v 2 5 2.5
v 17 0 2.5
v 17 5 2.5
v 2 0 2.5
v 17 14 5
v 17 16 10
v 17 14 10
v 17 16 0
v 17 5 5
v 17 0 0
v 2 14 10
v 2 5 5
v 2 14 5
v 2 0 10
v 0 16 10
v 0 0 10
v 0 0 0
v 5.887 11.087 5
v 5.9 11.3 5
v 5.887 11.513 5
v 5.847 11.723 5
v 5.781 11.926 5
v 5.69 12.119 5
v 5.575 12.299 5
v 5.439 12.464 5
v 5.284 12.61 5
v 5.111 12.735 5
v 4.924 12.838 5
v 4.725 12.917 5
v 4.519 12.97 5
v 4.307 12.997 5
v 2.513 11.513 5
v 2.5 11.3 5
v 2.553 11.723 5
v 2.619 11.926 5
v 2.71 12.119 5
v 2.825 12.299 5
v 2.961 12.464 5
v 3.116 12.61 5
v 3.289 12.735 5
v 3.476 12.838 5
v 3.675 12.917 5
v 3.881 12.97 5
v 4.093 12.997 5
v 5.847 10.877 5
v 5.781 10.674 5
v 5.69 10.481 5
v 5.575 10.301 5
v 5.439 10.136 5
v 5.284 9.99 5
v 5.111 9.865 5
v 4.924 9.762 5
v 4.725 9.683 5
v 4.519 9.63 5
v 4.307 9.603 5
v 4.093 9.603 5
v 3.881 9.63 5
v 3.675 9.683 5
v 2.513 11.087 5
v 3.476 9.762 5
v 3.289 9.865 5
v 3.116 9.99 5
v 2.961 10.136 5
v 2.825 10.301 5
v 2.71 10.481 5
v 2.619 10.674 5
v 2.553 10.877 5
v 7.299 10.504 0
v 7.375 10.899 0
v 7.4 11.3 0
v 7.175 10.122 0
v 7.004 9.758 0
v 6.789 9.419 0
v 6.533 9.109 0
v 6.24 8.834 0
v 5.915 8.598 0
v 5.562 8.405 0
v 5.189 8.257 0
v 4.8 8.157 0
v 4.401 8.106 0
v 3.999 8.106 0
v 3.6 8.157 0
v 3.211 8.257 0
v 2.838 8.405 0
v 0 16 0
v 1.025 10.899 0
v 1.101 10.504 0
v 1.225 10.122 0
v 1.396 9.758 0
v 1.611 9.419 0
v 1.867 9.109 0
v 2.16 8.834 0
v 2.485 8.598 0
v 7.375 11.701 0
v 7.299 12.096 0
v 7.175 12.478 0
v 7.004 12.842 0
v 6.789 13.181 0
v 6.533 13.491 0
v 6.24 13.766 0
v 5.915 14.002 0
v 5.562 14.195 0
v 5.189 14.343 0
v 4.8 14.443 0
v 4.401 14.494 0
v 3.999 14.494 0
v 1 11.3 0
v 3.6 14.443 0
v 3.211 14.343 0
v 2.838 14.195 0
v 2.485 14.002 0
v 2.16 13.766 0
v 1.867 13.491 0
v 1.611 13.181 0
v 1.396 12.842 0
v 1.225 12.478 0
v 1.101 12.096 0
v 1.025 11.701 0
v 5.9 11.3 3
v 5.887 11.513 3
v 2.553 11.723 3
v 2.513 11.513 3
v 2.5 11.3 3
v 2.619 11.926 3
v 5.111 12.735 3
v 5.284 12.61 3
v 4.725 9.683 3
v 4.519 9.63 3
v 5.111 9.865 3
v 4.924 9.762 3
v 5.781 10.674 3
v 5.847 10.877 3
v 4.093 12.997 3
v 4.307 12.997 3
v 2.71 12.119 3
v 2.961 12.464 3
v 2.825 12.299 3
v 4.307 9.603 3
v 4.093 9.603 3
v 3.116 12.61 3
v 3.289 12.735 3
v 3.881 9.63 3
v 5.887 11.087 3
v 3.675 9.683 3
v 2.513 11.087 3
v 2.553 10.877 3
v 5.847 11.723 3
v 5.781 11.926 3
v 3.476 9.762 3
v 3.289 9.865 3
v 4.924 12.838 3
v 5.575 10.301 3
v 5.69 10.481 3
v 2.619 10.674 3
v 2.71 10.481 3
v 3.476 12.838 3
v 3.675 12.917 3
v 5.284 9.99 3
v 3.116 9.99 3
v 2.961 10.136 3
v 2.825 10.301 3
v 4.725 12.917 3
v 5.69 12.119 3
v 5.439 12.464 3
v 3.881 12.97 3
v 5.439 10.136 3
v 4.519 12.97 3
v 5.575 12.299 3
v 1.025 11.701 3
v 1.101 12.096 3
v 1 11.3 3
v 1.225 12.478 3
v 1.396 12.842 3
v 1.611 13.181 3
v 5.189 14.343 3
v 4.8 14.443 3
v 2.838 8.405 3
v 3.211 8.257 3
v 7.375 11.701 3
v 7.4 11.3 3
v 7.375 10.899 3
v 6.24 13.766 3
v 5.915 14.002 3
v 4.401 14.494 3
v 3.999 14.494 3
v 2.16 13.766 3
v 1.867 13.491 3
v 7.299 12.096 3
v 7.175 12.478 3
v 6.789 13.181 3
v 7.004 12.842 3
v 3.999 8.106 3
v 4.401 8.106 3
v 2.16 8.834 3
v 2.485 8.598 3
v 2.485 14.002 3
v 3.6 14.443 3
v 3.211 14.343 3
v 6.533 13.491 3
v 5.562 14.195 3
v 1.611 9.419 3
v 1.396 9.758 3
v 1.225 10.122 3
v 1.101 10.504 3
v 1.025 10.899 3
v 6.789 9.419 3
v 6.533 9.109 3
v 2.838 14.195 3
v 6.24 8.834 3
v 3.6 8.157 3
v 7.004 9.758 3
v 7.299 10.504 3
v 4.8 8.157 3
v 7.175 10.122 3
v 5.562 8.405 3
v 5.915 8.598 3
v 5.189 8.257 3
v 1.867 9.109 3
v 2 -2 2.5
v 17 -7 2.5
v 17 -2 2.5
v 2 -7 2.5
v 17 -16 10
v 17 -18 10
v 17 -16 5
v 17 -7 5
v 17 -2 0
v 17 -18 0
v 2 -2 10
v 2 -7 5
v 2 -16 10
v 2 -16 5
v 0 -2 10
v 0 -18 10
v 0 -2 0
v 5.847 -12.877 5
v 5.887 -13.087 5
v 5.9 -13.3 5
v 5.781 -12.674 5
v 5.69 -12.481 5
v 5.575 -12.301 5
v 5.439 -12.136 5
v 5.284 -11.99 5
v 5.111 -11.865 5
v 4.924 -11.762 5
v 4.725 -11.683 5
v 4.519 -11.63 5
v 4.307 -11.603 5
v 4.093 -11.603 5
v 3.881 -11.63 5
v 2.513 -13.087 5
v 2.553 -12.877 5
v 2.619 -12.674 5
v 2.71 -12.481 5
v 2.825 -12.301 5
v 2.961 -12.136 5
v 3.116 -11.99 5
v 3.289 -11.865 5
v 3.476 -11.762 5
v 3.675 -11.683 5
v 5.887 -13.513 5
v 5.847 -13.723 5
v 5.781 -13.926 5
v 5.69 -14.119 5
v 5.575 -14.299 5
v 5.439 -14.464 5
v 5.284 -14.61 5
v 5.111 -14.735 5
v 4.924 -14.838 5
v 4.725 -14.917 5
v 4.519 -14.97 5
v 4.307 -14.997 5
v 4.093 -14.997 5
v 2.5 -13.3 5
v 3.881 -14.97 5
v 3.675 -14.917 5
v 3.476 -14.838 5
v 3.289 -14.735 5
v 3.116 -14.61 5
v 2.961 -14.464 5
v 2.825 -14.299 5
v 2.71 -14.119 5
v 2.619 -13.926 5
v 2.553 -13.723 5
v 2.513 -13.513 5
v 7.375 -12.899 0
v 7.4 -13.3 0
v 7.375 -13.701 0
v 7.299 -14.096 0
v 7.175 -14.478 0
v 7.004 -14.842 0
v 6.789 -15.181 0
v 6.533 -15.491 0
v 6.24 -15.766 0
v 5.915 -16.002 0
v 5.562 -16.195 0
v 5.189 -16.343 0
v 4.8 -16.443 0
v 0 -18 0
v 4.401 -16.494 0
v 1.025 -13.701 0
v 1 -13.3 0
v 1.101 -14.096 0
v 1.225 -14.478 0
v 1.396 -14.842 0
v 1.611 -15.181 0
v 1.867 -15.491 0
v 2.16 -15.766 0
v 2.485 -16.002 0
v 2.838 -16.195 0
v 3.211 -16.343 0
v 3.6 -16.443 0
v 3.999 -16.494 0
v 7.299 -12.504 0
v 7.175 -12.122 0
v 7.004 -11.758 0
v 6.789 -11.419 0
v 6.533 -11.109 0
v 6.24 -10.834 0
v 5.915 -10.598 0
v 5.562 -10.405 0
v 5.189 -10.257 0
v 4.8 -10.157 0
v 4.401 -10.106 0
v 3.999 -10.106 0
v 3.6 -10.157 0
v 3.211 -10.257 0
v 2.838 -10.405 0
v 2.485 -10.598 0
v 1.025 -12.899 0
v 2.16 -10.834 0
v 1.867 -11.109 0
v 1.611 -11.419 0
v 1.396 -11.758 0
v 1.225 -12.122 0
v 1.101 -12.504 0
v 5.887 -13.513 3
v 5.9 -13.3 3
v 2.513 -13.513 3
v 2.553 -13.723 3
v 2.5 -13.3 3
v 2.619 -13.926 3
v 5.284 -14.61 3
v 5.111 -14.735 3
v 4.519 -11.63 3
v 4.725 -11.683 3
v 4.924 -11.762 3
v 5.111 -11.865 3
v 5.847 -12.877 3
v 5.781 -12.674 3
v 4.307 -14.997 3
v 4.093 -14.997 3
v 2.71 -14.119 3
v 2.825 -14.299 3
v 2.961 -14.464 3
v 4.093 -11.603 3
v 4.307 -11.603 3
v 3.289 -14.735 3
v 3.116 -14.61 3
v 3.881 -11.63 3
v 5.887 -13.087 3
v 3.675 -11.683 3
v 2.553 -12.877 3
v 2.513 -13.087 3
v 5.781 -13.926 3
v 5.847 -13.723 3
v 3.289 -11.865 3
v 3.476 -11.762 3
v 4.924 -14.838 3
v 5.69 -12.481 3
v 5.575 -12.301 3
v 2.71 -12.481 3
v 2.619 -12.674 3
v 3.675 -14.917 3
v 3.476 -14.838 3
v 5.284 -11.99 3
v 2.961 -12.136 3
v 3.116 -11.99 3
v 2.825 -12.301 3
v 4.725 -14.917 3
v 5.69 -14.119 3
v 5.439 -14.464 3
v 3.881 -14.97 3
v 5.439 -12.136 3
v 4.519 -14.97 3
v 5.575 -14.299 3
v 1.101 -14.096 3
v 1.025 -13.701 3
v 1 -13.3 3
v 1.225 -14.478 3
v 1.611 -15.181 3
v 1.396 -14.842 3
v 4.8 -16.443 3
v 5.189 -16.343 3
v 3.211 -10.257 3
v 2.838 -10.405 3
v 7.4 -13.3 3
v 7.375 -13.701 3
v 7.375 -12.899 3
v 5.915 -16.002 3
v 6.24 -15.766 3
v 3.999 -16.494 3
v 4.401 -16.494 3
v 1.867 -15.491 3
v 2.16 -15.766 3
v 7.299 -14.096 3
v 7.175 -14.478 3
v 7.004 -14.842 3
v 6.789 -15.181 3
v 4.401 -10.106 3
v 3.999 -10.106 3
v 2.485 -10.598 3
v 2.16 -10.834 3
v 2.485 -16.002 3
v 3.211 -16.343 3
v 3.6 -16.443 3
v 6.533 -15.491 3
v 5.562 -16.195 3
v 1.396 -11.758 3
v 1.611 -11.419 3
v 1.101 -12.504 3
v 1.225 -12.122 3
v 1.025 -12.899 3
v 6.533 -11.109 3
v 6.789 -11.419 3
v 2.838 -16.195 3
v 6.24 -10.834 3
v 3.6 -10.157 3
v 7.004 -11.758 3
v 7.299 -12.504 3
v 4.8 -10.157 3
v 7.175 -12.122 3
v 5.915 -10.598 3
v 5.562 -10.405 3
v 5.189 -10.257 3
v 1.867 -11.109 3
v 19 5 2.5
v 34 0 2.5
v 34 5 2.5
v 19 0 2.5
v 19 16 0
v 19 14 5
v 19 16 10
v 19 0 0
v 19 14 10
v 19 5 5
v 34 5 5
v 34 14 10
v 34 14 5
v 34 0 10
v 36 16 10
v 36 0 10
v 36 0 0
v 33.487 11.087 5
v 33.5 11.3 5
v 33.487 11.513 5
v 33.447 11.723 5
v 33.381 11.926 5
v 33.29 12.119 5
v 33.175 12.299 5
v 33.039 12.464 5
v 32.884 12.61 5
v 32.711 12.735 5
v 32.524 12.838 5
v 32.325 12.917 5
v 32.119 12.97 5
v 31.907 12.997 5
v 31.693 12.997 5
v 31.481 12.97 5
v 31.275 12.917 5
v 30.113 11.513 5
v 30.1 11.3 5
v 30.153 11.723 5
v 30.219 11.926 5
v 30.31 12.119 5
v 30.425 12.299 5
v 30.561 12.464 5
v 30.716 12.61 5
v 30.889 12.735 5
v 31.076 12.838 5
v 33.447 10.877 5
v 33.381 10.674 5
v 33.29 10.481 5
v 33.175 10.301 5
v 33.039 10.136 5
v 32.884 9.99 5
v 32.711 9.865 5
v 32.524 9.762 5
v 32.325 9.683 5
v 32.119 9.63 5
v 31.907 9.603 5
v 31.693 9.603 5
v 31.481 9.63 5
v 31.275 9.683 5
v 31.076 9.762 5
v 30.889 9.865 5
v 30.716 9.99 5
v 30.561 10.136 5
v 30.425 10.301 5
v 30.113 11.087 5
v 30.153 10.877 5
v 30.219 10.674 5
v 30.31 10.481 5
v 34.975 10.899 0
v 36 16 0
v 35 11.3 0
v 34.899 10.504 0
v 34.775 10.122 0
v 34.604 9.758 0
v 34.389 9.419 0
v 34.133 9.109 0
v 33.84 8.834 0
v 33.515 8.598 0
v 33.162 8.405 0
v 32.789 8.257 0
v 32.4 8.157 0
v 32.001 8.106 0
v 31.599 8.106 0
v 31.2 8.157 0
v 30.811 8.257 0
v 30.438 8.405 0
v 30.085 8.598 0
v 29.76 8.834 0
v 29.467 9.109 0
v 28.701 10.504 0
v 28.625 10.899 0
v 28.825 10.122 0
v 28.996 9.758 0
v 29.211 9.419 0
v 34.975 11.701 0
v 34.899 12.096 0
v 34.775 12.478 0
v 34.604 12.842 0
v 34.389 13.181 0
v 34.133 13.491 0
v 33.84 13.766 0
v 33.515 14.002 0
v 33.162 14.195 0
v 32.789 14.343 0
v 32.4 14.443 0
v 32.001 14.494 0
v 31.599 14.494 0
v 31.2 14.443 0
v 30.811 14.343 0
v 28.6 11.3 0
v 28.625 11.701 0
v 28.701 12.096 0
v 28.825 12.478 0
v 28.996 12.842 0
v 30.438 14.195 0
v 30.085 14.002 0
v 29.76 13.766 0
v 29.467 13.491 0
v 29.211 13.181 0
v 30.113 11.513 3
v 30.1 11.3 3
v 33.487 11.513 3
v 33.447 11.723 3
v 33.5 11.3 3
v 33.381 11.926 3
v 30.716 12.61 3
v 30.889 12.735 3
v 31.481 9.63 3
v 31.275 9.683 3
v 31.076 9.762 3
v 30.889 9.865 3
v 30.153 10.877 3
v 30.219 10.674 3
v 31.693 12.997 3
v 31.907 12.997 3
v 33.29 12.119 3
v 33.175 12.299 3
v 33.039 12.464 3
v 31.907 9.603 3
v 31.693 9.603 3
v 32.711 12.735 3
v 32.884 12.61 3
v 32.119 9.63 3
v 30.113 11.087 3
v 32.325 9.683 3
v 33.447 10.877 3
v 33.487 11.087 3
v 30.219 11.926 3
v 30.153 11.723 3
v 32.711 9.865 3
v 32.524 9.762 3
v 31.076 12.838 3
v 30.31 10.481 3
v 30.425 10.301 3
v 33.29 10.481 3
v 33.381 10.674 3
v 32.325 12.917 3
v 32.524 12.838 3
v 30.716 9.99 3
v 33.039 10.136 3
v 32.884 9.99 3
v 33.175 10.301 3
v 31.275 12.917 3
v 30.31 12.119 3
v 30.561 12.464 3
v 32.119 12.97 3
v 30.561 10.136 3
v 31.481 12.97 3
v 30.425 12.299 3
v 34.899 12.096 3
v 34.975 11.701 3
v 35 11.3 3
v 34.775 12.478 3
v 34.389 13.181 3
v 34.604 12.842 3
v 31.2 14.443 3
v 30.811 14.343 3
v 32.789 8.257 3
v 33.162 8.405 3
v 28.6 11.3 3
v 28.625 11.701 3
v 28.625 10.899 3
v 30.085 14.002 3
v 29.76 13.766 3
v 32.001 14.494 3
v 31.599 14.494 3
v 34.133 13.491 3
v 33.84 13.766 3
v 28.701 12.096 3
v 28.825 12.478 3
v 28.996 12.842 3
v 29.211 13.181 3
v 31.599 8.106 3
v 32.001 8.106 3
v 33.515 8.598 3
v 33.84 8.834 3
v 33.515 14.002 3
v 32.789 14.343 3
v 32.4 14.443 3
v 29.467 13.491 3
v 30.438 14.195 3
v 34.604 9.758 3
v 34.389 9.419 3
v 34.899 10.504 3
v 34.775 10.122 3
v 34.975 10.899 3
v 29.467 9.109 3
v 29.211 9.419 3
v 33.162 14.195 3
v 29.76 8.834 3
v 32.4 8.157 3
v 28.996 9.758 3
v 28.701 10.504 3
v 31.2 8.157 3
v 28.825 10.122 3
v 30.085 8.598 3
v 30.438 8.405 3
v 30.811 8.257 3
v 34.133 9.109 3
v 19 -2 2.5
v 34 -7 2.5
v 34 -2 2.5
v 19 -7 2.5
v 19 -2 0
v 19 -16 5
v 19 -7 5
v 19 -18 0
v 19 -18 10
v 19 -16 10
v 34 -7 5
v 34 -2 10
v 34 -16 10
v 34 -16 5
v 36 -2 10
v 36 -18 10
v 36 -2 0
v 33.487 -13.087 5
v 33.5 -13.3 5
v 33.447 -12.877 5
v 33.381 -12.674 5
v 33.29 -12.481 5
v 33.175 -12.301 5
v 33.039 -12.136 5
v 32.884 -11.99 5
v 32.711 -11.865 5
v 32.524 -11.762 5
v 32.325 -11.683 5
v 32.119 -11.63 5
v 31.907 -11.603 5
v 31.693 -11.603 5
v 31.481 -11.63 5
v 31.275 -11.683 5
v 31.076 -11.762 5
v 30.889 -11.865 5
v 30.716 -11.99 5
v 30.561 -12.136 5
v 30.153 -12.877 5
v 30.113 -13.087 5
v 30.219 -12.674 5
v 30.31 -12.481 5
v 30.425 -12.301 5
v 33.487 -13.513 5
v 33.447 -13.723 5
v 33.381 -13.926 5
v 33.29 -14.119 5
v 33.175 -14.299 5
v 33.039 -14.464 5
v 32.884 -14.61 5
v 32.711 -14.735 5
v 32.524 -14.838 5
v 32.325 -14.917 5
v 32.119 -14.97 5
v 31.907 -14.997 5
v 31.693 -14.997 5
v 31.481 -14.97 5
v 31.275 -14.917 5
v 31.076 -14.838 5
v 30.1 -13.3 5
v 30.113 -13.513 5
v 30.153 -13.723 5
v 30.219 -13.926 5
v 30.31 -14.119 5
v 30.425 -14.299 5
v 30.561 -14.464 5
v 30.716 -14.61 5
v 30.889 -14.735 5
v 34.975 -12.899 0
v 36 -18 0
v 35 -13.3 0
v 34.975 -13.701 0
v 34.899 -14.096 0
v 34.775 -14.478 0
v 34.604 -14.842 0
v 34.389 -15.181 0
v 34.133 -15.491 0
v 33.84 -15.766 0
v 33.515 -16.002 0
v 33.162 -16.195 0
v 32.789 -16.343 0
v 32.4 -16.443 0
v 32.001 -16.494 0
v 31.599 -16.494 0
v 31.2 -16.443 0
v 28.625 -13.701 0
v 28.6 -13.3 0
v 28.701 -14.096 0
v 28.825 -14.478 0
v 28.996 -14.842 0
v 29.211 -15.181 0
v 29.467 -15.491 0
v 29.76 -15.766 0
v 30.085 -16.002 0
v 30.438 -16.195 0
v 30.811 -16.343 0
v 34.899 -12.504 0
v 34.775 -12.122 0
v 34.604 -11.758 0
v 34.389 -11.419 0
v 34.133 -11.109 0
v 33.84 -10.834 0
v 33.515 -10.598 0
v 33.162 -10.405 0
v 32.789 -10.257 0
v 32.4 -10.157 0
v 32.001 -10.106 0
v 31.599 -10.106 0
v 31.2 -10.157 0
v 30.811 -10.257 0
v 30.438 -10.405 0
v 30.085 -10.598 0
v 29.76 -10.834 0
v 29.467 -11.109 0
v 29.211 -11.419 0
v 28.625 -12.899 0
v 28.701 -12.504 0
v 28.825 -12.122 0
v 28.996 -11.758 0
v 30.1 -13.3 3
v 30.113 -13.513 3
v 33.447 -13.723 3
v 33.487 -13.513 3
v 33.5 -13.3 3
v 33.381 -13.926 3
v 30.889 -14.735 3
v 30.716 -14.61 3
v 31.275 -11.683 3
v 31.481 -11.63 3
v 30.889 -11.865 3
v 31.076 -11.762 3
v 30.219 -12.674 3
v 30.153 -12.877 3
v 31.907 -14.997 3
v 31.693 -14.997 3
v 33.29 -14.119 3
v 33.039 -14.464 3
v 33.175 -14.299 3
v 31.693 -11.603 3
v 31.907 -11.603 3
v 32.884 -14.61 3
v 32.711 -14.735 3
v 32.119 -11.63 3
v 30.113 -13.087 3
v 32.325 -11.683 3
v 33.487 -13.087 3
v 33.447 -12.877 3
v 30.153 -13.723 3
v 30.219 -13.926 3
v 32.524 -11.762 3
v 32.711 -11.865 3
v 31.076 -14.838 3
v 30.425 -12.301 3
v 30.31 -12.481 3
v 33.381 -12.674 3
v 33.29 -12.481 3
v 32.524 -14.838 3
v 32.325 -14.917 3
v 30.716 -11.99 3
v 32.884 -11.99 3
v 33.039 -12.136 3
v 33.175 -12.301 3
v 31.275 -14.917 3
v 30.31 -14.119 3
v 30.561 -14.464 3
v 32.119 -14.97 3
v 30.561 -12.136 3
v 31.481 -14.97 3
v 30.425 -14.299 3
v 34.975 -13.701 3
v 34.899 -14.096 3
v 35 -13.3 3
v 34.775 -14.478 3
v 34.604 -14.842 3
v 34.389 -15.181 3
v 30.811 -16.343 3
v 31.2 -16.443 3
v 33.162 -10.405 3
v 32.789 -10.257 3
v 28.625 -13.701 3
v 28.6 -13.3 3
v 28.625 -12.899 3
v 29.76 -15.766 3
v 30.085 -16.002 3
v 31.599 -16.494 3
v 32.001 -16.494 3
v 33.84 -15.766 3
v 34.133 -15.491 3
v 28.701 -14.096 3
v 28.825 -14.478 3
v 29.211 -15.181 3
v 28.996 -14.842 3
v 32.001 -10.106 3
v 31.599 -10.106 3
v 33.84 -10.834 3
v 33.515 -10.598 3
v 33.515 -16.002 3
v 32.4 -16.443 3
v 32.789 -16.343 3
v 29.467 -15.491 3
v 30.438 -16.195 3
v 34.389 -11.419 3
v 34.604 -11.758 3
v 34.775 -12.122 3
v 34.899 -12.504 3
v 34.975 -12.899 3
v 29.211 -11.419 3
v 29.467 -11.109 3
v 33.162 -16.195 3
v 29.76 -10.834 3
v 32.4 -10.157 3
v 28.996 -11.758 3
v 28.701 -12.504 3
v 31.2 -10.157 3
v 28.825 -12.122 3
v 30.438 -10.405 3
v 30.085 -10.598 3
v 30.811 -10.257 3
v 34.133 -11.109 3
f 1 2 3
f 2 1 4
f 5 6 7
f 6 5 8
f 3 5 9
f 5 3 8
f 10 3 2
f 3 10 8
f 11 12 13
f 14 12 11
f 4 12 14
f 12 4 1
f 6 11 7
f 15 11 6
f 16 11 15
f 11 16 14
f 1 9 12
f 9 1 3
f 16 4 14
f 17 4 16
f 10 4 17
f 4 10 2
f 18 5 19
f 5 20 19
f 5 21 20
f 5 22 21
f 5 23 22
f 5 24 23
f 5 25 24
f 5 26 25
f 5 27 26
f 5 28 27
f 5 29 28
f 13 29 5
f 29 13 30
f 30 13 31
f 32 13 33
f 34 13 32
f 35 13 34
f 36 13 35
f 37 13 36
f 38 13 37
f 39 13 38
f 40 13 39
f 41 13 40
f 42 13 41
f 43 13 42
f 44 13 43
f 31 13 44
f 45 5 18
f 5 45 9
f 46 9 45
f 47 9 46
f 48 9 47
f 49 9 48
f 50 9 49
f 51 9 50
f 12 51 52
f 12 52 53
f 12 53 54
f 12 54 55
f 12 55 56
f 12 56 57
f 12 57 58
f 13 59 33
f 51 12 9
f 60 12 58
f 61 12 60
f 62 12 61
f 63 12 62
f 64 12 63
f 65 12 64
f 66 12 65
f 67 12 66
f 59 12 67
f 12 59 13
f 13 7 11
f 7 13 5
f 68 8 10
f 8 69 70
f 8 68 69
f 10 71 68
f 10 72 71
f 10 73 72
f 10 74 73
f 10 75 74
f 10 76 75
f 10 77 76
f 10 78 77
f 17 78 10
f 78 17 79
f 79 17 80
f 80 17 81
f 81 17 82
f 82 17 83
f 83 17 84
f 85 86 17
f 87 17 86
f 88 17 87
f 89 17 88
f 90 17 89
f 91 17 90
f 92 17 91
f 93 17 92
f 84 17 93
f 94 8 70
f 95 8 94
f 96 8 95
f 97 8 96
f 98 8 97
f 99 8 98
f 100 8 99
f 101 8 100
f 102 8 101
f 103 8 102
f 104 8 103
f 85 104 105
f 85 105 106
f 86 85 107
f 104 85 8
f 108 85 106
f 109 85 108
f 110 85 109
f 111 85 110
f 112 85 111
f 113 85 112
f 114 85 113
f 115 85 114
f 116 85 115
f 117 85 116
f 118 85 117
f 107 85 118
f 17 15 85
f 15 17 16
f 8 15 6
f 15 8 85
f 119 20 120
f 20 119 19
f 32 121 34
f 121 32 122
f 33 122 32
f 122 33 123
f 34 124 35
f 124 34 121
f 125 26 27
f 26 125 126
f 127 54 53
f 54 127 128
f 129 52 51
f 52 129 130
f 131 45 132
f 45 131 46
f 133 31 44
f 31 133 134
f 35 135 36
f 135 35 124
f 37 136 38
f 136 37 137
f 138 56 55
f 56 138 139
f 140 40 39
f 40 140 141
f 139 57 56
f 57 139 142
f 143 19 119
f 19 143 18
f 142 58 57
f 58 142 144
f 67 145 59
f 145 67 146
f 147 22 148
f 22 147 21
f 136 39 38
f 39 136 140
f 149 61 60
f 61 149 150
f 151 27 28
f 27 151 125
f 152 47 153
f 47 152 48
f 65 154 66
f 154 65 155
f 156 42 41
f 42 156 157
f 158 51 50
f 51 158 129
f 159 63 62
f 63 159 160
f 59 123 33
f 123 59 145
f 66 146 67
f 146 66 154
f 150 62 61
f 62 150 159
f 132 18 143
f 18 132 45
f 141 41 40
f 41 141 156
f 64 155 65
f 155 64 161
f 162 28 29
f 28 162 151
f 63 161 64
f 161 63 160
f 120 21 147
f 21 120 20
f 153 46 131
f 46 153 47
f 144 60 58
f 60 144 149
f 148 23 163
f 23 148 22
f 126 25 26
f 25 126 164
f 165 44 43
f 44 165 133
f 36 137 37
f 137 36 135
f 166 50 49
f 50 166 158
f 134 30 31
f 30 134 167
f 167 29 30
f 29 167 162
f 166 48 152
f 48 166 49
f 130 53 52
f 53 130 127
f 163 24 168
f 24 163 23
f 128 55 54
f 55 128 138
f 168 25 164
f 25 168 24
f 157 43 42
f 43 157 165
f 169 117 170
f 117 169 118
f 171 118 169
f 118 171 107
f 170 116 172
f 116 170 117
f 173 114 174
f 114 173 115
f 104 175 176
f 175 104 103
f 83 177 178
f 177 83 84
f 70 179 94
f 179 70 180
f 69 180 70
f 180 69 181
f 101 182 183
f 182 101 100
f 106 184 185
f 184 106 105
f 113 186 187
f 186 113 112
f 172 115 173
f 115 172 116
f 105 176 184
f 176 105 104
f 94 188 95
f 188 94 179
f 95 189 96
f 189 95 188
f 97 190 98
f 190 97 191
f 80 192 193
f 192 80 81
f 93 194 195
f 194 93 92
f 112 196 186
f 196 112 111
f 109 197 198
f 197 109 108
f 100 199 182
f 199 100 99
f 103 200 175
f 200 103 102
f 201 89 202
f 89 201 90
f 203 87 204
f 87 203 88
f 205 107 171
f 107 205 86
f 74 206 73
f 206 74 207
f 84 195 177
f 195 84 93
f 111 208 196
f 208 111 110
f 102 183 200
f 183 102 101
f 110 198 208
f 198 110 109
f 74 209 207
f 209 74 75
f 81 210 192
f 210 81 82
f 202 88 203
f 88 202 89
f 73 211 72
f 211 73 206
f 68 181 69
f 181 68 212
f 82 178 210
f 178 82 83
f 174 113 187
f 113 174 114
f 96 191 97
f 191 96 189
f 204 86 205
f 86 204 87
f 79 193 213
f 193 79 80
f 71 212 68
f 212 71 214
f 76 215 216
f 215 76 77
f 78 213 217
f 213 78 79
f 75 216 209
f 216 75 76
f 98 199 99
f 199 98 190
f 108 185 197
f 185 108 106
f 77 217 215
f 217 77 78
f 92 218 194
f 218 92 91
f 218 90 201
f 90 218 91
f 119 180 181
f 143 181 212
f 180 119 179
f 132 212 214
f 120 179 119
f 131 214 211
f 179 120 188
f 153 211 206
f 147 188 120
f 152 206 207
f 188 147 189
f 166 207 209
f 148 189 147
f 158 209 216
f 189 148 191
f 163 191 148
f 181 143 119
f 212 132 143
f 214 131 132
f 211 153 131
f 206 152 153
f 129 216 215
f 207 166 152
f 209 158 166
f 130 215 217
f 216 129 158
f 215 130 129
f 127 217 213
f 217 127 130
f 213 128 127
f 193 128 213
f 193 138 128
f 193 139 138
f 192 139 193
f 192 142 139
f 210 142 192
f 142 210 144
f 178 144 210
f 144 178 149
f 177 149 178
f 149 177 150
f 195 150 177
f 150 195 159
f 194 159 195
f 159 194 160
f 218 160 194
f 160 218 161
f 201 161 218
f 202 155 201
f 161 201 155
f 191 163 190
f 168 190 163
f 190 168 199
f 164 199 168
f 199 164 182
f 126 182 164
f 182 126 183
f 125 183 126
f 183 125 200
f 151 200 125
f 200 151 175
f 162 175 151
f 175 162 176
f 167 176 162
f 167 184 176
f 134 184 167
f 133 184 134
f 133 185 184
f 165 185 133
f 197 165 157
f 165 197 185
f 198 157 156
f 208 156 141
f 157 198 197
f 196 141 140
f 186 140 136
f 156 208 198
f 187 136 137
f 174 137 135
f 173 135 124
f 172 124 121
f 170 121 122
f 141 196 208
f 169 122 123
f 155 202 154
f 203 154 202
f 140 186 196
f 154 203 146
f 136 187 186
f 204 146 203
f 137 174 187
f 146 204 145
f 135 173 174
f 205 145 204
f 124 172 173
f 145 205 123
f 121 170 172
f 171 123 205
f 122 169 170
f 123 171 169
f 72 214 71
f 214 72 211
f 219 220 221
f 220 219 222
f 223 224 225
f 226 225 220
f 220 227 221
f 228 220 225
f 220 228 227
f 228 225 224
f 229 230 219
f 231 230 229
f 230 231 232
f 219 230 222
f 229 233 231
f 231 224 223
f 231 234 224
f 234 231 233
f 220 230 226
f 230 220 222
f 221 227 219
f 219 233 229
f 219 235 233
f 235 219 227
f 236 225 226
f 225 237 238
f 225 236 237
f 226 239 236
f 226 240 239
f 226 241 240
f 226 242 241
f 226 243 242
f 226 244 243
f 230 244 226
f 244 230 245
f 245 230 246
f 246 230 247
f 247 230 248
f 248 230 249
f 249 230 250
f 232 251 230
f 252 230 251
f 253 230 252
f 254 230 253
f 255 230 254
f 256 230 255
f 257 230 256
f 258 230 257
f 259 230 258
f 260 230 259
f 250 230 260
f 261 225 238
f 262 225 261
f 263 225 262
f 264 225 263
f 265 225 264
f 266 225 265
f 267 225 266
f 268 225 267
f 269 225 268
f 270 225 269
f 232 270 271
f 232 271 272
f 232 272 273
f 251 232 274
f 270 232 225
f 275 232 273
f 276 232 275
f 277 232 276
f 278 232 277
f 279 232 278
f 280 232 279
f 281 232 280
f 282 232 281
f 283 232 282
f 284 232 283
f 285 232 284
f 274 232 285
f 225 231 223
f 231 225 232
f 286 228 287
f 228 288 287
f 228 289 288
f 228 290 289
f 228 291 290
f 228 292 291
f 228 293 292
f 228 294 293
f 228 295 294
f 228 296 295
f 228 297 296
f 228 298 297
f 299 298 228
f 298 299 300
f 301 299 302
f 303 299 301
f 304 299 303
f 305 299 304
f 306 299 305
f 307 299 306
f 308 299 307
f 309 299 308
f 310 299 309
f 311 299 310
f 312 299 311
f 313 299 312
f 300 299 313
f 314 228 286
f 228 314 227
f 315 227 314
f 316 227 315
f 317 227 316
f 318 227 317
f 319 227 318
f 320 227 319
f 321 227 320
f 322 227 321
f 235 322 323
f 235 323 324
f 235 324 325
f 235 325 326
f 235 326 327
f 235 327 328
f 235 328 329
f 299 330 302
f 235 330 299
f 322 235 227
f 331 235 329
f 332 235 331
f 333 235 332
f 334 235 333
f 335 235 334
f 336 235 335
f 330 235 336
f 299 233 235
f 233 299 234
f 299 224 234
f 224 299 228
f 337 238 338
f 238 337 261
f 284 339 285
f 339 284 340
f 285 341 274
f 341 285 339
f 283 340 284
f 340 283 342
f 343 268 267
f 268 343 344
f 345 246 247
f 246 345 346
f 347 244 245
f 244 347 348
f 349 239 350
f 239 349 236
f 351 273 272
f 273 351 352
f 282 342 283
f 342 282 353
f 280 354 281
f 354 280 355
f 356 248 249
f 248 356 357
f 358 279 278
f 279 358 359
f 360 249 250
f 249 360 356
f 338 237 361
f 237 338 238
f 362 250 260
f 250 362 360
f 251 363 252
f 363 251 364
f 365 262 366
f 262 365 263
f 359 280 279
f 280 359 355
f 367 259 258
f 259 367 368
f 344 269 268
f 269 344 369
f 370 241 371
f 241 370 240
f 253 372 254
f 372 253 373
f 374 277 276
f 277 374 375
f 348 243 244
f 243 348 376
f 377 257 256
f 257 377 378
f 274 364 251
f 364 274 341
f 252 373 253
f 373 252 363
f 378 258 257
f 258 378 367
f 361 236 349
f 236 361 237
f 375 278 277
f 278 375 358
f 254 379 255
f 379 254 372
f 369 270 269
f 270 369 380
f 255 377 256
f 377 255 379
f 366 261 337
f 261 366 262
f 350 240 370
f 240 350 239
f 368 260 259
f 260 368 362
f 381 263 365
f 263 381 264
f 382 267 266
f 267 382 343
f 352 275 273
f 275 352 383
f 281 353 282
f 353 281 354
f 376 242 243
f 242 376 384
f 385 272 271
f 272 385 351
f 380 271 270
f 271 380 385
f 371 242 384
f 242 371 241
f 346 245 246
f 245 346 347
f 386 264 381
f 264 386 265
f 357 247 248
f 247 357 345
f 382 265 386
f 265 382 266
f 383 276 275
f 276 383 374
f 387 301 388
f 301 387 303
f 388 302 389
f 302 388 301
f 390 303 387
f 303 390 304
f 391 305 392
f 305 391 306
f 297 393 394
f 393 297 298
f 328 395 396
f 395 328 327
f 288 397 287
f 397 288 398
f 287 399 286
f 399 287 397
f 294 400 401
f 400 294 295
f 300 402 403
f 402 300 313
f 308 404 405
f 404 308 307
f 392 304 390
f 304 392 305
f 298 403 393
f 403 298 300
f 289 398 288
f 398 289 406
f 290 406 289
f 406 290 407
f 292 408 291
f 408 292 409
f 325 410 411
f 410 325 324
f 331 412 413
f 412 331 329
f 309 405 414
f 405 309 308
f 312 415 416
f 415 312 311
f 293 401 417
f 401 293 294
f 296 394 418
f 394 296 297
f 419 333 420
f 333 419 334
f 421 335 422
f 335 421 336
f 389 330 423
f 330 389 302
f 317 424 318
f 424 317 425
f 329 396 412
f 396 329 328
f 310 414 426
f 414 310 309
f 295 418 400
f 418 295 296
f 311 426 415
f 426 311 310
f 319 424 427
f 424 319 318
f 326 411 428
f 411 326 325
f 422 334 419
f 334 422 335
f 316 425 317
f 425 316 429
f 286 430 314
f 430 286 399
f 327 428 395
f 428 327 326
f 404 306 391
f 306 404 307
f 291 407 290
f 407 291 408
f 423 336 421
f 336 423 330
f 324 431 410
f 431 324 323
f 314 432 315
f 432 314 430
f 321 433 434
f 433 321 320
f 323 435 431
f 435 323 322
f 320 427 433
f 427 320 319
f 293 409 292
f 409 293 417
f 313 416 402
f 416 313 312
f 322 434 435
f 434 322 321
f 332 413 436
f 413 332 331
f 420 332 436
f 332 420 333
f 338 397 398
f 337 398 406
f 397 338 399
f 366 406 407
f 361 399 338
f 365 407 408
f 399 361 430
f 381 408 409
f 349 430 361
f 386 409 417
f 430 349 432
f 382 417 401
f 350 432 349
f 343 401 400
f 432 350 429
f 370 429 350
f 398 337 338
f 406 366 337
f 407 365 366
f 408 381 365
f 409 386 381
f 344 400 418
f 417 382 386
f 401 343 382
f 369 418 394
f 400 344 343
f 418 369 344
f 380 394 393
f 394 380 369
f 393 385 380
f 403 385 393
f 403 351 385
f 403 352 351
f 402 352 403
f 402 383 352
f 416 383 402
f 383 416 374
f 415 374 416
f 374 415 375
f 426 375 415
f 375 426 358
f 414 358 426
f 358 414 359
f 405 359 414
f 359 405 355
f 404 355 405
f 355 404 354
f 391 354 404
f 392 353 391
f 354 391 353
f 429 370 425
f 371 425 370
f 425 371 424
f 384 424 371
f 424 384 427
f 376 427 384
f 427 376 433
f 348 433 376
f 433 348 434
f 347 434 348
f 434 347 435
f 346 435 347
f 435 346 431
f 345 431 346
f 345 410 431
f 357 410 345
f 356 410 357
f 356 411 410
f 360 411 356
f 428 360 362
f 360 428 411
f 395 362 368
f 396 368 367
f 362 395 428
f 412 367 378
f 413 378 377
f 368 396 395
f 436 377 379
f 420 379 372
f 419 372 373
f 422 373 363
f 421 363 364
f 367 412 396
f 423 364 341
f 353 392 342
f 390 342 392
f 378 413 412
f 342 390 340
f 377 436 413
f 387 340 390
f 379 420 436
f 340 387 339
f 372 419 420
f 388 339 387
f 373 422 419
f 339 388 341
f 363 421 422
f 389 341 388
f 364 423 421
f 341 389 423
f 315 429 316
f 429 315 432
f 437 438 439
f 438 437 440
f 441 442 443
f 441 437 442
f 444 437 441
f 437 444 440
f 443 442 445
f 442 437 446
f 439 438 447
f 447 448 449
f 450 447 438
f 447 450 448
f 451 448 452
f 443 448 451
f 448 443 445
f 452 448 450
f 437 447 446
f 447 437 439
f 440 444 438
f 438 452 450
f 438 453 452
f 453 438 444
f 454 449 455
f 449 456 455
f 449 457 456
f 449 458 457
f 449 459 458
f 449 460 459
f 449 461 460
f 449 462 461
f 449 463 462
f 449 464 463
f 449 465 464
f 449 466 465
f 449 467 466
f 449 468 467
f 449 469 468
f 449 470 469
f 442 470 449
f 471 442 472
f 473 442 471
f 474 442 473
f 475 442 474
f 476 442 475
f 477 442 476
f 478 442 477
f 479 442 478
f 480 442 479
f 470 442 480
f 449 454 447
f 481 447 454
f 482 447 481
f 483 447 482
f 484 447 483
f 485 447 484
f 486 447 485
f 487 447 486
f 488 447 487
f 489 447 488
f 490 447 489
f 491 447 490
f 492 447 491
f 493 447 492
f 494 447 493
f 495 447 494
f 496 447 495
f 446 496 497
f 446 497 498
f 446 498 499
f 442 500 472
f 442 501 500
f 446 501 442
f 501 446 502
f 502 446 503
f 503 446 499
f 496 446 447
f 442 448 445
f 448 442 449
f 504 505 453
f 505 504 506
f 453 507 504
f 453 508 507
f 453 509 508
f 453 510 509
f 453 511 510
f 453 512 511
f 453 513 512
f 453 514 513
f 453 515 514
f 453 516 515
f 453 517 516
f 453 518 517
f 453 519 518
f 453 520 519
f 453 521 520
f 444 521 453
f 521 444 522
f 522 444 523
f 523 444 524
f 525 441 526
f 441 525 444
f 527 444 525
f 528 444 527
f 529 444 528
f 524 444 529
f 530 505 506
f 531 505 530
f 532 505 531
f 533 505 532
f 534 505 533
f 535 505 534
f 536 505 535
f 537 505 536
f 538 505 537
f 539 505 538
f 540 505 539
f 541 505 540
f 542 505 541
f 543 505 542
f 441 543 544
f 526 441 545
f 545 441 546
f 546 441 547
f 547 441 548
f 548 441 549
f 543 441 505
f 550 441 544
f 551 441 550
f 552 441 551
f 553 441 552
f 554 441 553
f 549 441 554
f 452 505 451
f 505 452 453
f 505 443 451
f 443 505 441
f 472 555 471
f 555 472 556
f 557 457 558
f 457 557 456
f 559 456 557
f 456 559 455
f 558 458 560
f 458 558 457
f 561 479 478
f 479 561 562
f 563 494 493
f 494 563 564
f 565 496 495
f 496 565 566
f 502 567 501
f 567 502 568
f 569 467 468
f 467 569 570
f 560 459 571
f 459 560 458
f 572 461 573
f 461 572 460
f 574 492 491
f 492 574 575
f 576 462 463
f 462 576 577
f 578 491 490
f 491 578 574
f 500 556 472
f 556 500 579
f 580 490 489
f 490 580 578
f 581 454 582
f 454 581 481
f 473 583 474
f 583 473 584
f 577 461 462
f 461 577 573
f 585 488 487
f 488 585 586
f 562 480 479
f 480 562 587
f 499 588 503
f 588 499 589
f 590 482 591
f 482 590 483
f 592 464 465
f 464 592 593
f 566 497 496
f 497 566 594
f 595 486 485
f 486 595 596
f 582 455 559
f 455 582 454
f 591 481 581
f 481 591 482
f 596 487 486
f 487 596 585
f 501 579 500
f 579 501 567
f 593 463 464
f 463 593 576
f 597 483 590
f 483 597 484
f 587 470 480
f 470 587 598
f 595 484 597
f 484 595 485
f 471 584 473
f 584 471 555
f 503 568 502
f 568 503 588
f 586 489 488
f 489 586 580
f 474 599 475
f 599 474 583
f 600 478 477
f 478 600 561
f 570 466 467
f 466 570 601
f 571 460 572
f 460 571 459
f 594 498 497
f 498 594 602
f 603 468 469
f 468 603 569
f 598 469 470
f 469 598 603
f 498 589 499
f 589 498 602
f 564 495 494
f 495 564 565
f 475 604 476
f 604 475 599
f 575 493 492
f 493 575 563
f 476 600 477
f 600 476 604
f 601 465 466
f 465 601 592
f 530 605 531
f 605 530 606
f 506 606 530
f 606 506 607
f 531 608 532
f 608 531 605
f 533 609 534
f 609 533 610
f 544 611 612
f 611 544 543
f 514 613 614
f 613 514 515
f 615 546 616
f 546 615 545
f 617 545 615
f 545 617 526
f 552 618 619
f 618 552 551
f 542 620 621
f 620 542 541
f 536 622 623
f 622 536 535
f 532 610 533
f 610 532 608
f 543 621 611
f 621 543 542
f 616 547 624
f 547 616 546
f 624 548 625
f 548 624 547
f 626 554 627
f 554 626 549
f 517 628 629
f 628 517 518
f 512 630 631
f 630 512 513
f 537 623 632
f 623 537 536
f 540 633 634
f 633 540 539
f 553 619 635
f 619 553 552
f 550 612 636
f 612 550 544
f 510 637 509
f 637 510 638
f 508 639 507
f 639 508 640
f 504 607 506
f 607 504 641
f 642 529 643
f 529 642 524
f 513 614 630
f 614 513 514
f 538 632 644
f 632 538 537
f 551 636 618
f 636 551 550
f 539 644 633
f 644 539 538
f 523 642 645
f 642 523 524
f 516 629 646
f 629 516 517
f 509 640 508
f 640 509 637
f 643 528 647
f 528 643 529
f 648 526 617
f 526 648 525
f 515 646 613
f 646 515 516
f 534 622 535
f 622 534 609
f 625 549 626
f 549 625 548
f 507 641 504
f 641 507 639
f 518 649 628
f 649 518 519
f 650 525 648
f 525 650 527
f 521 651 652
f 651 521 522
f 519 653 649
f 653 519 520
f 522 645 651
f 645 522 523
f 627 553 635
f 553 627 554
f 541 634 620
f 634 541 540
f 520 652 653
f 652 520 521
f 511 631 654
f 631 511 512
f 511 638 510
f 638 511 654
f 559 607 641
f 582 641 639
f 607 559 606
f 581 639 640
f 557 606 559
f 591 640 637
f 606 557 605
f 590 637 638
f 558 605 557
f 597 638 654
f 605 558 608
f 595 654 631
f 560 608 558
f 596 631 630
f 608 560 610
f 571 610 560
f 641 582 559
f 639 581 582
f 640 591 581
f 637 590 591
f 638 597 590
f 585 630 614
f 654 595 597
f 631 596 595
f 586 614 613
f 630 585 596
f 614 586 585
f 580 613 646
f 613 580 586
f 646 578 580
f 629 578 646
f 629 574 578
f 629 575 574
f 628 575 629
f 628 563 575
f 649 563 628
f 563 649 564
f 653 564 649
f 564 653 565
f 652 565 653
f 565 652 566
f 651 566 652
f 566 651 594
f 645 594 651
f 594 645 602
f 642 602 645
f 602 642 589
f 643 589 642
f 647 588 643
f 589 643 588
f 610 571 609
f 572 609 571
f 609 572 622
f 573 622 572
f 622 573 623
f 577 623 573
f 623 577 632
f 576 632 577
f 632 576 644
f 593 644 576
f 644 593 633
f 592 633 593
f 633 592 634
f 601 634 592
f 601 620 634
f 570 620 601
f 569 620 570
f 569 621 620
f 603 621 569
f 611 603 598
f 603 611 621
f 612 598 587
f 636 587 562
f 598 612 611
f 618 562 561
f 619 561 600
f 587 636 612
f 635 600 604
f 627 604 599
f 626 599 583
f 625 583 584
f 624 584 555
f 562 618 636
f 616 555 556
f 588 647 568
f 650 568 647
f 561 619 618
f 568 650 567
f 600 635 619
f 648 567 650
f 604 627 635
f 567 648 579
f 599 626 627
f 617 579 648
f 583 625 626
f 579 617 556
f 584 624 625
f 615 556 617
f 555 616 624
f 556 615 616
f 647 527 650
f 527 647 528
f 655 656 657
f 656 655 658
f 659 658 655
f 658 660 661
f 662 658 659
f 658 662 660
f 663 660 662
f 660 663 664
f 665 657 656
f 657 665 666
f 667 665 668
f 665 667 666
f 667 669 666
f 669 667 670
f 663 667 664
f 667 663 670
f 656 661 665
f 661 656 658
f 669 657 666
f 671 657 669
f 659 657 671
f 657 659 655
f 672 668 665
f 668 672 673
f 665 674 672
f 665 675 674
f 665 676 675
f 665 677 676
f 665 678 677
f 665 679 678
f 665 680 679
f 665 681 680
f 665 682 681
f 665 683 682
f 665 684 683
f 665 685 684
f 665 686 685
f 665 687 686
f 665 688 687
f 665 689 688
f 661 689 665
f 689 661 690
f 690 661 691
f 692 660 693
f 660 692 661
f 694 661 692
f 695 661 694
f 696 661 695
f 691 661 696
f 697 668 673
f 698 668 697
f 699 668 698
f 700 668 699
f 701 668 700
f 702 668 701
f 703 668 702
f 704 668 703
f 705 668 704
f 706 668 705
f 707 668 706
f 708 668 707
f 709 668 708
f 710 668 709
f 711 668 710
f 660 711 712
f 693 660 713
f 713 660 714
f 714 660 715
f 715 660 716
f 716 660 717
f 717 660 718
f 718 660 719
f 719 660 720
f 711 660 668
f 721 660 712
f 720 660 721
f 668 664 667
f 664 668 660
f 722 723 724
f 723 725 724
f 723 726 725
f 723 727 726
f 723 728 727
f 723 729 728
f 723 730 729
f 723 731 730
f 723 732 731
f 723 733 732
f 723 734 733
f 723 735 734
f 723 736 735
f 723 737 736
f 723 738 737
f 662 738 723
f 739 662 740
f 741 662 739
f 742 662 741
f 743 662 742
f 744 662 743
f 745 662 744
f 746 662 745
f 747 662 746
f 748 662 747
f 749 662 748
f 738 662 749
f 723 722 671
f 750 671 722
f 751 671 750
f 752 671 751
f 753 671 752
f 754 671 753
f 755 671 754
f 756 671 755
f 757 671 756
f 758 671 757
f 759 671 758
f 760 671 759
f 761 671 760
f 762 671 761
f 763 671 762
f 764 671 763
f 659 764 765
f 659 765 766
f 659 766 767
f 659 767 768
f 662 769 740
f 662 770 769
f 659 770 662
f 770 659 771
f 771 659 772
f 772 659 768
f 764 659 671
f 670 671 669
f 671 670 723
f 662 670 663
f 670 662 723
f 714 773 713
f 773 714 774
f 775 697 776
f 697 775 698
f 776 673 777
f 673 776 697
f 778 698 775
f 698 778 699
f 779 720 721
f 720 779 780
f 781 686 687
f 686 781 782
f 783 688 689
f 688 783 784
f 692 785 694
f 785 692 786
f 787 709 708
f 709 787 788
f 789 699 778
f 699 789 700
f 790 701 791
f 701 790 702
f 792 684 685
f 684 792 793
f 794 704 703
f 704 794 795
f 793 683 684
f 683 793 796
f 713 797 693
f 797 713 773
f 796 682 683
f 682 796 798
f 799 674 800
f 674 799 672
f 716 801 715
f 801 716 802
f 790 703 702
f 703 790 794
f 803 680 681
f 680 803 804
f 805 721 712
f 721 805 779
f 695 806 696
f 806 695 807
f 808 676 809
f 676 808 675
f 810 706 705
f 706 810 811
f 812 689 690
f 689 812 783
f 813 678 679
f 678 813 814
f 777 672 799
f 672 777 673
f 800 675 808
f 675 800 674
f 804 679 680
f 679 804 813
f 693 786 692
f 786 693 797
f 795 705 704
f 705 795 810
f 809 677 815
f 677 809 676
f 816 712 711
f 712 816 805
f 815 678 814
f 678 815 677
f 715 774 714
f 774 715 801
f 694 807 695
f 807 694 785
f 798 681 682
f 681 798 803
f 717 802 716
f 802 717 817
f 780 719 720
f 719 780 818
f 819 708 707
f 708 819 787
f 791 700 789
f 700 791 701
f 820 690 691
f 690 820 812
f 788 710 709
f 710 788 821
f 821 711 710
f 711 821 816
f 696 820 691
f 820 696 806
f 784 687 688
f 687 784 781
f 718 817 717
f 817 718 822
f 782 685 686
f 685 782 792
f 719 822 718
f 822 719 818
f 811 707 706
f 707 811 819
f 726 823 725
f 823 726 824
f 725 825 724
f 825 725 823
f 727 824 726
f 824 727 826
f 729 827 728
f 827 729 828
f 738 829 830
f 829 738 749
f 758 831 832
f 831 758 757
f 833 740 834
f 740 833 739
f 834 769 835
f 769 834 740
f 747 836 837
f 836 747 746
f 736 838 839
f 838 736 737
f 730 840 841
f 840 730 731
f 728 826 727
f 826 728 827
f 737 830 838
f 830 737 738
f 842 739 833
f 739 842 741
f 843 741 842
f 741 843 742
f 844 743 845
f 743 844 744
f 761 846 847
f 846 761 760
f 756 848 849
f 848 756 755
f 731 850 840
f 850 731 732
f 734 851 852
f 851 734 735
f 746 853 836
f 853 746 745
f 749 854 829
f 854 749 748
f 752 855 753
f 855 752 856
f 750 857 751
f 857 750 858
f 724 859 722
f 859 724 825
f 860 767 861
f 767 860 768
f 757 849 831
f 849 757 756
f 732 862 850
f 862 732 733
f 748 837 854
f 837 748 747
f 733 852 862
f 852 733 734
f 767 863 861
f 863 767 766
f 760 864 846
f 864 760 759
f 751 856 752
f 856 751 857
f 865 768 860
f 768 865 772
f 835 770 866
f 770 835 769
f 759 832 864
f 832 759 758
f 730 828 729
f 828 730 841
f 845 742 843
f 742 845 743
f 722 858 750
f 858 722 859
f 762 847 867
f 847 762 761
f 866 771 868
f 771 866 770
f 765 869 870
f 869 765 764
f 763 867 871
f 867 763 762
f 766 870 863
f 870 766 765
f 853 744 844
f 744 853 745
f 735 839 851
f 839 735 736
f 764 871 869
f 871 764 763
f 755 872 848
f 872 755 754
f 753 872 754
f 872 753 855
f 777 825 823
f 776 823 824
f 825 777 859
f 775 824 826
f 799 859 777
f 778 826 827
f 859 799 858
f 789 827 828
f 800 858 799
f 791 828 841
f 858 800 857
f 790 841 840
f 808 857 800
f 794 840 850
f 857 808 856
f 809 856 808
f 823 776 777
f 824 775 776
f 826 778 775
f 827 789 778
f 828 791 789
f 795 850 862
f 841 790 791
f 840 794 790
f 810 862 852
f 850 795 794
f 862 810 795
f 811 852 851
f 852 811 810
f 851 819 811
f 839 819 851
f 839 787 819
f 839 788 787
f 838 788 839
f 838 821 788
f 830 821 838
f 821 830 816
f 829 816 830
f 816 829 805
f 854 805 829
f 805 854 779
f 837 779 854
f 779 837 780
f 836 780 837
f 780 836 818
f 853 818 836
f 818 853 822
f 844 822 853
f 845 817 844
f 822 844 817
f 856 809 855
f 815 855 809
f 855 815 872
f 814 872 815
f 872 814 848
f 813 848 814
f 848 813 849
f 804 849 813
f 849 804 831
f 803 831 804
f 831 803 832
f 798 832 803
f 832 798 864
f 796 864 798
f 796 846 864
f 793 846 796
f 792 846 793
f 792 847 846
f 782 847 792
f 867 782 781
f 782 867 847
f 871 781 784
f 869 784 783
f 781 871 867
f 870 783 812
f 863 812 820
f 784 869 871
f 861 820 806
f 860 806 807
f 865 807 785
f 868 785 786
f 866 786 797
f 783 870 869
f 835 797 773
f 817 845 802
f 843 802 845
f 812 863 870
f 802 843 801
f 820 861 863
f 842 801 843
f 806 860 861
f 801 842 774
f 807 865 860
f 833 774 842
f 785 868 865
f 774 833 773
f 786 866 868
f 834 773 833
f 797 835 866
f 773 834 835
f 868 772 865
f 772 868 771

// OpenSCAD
//Created by Oskar Henriksson, Chalmers, Sweden
//[mm]


z = 15; //just the total width
edge_skirt_h = 5;
edge_skirt_t = 2;

glass_t = 2.5; //glass thickness
glass_space = 18/2; //space between glass and end of heat bed
glass_overlap = 5;
glass_overlap_t = 2.5;

screw_offs_z = 2.2; //distance from edge of the bed to center of the screw
screw_offs_y = 2.7; 
screw_r = 1.5+0.2; // d+margin
screw_head_r = 3+0.2; // margin included
screw_head_h = 3;
if(screw_head_h >= glass_t + glass_overlap_t){
    echo("ERROR: screw_head_h is too high!");
}
if(screw_offs_y < screw_r || screw_offs_z < screw_r){
    echo("ERROR: screw_offset destroys the skirt");
}


tot_y = edge_skirt_t + glass_overlap + glass_space;
tot_z = edge_skirt_t + z;
tot_x = edge_skirt_h + glass_t + glass_overlap_t; // total height including skirt



clampPair();
translate([tot_z*2+2,0,0])
mirror([1,0,0])
clampPair();
    

module clampPair(){
    translate([0,0,tot_x])
     rotate([0,90,0]){
                leftClamp();
                translate([0,-2,0])
                  rightClamp();
                
            }
        }


module rightClamp(){
      mirror([0,1,0]){
        leftClamp();
    }
}

module leftClamp(){
    difference(){
        difference(){
            cube([tot_x,tot_y,tot_z]);
            translate([0,0,edge_skirt_t])
            union(){
                  cube([edge_skirt_h+glass_t,glass_overlap,z]);
                    cube([edge_skirt_h,tot_y-edge_skirt_t,z]);
                }
            
        }
        #translate([0,tot_y-edge_skirt_t-screw_offs_y,edge_skirt_t+screw_offs_z]) rotate ([0,90,0])
        union(){
            cylinder (h = tot_x, r=screw_r, $fn=50);
            translate([0,0,tot_x-screw_head_h]) cylinder (h = screw_head_h+1, r=screw_head_r, $fn=50);
        }
    }
}
